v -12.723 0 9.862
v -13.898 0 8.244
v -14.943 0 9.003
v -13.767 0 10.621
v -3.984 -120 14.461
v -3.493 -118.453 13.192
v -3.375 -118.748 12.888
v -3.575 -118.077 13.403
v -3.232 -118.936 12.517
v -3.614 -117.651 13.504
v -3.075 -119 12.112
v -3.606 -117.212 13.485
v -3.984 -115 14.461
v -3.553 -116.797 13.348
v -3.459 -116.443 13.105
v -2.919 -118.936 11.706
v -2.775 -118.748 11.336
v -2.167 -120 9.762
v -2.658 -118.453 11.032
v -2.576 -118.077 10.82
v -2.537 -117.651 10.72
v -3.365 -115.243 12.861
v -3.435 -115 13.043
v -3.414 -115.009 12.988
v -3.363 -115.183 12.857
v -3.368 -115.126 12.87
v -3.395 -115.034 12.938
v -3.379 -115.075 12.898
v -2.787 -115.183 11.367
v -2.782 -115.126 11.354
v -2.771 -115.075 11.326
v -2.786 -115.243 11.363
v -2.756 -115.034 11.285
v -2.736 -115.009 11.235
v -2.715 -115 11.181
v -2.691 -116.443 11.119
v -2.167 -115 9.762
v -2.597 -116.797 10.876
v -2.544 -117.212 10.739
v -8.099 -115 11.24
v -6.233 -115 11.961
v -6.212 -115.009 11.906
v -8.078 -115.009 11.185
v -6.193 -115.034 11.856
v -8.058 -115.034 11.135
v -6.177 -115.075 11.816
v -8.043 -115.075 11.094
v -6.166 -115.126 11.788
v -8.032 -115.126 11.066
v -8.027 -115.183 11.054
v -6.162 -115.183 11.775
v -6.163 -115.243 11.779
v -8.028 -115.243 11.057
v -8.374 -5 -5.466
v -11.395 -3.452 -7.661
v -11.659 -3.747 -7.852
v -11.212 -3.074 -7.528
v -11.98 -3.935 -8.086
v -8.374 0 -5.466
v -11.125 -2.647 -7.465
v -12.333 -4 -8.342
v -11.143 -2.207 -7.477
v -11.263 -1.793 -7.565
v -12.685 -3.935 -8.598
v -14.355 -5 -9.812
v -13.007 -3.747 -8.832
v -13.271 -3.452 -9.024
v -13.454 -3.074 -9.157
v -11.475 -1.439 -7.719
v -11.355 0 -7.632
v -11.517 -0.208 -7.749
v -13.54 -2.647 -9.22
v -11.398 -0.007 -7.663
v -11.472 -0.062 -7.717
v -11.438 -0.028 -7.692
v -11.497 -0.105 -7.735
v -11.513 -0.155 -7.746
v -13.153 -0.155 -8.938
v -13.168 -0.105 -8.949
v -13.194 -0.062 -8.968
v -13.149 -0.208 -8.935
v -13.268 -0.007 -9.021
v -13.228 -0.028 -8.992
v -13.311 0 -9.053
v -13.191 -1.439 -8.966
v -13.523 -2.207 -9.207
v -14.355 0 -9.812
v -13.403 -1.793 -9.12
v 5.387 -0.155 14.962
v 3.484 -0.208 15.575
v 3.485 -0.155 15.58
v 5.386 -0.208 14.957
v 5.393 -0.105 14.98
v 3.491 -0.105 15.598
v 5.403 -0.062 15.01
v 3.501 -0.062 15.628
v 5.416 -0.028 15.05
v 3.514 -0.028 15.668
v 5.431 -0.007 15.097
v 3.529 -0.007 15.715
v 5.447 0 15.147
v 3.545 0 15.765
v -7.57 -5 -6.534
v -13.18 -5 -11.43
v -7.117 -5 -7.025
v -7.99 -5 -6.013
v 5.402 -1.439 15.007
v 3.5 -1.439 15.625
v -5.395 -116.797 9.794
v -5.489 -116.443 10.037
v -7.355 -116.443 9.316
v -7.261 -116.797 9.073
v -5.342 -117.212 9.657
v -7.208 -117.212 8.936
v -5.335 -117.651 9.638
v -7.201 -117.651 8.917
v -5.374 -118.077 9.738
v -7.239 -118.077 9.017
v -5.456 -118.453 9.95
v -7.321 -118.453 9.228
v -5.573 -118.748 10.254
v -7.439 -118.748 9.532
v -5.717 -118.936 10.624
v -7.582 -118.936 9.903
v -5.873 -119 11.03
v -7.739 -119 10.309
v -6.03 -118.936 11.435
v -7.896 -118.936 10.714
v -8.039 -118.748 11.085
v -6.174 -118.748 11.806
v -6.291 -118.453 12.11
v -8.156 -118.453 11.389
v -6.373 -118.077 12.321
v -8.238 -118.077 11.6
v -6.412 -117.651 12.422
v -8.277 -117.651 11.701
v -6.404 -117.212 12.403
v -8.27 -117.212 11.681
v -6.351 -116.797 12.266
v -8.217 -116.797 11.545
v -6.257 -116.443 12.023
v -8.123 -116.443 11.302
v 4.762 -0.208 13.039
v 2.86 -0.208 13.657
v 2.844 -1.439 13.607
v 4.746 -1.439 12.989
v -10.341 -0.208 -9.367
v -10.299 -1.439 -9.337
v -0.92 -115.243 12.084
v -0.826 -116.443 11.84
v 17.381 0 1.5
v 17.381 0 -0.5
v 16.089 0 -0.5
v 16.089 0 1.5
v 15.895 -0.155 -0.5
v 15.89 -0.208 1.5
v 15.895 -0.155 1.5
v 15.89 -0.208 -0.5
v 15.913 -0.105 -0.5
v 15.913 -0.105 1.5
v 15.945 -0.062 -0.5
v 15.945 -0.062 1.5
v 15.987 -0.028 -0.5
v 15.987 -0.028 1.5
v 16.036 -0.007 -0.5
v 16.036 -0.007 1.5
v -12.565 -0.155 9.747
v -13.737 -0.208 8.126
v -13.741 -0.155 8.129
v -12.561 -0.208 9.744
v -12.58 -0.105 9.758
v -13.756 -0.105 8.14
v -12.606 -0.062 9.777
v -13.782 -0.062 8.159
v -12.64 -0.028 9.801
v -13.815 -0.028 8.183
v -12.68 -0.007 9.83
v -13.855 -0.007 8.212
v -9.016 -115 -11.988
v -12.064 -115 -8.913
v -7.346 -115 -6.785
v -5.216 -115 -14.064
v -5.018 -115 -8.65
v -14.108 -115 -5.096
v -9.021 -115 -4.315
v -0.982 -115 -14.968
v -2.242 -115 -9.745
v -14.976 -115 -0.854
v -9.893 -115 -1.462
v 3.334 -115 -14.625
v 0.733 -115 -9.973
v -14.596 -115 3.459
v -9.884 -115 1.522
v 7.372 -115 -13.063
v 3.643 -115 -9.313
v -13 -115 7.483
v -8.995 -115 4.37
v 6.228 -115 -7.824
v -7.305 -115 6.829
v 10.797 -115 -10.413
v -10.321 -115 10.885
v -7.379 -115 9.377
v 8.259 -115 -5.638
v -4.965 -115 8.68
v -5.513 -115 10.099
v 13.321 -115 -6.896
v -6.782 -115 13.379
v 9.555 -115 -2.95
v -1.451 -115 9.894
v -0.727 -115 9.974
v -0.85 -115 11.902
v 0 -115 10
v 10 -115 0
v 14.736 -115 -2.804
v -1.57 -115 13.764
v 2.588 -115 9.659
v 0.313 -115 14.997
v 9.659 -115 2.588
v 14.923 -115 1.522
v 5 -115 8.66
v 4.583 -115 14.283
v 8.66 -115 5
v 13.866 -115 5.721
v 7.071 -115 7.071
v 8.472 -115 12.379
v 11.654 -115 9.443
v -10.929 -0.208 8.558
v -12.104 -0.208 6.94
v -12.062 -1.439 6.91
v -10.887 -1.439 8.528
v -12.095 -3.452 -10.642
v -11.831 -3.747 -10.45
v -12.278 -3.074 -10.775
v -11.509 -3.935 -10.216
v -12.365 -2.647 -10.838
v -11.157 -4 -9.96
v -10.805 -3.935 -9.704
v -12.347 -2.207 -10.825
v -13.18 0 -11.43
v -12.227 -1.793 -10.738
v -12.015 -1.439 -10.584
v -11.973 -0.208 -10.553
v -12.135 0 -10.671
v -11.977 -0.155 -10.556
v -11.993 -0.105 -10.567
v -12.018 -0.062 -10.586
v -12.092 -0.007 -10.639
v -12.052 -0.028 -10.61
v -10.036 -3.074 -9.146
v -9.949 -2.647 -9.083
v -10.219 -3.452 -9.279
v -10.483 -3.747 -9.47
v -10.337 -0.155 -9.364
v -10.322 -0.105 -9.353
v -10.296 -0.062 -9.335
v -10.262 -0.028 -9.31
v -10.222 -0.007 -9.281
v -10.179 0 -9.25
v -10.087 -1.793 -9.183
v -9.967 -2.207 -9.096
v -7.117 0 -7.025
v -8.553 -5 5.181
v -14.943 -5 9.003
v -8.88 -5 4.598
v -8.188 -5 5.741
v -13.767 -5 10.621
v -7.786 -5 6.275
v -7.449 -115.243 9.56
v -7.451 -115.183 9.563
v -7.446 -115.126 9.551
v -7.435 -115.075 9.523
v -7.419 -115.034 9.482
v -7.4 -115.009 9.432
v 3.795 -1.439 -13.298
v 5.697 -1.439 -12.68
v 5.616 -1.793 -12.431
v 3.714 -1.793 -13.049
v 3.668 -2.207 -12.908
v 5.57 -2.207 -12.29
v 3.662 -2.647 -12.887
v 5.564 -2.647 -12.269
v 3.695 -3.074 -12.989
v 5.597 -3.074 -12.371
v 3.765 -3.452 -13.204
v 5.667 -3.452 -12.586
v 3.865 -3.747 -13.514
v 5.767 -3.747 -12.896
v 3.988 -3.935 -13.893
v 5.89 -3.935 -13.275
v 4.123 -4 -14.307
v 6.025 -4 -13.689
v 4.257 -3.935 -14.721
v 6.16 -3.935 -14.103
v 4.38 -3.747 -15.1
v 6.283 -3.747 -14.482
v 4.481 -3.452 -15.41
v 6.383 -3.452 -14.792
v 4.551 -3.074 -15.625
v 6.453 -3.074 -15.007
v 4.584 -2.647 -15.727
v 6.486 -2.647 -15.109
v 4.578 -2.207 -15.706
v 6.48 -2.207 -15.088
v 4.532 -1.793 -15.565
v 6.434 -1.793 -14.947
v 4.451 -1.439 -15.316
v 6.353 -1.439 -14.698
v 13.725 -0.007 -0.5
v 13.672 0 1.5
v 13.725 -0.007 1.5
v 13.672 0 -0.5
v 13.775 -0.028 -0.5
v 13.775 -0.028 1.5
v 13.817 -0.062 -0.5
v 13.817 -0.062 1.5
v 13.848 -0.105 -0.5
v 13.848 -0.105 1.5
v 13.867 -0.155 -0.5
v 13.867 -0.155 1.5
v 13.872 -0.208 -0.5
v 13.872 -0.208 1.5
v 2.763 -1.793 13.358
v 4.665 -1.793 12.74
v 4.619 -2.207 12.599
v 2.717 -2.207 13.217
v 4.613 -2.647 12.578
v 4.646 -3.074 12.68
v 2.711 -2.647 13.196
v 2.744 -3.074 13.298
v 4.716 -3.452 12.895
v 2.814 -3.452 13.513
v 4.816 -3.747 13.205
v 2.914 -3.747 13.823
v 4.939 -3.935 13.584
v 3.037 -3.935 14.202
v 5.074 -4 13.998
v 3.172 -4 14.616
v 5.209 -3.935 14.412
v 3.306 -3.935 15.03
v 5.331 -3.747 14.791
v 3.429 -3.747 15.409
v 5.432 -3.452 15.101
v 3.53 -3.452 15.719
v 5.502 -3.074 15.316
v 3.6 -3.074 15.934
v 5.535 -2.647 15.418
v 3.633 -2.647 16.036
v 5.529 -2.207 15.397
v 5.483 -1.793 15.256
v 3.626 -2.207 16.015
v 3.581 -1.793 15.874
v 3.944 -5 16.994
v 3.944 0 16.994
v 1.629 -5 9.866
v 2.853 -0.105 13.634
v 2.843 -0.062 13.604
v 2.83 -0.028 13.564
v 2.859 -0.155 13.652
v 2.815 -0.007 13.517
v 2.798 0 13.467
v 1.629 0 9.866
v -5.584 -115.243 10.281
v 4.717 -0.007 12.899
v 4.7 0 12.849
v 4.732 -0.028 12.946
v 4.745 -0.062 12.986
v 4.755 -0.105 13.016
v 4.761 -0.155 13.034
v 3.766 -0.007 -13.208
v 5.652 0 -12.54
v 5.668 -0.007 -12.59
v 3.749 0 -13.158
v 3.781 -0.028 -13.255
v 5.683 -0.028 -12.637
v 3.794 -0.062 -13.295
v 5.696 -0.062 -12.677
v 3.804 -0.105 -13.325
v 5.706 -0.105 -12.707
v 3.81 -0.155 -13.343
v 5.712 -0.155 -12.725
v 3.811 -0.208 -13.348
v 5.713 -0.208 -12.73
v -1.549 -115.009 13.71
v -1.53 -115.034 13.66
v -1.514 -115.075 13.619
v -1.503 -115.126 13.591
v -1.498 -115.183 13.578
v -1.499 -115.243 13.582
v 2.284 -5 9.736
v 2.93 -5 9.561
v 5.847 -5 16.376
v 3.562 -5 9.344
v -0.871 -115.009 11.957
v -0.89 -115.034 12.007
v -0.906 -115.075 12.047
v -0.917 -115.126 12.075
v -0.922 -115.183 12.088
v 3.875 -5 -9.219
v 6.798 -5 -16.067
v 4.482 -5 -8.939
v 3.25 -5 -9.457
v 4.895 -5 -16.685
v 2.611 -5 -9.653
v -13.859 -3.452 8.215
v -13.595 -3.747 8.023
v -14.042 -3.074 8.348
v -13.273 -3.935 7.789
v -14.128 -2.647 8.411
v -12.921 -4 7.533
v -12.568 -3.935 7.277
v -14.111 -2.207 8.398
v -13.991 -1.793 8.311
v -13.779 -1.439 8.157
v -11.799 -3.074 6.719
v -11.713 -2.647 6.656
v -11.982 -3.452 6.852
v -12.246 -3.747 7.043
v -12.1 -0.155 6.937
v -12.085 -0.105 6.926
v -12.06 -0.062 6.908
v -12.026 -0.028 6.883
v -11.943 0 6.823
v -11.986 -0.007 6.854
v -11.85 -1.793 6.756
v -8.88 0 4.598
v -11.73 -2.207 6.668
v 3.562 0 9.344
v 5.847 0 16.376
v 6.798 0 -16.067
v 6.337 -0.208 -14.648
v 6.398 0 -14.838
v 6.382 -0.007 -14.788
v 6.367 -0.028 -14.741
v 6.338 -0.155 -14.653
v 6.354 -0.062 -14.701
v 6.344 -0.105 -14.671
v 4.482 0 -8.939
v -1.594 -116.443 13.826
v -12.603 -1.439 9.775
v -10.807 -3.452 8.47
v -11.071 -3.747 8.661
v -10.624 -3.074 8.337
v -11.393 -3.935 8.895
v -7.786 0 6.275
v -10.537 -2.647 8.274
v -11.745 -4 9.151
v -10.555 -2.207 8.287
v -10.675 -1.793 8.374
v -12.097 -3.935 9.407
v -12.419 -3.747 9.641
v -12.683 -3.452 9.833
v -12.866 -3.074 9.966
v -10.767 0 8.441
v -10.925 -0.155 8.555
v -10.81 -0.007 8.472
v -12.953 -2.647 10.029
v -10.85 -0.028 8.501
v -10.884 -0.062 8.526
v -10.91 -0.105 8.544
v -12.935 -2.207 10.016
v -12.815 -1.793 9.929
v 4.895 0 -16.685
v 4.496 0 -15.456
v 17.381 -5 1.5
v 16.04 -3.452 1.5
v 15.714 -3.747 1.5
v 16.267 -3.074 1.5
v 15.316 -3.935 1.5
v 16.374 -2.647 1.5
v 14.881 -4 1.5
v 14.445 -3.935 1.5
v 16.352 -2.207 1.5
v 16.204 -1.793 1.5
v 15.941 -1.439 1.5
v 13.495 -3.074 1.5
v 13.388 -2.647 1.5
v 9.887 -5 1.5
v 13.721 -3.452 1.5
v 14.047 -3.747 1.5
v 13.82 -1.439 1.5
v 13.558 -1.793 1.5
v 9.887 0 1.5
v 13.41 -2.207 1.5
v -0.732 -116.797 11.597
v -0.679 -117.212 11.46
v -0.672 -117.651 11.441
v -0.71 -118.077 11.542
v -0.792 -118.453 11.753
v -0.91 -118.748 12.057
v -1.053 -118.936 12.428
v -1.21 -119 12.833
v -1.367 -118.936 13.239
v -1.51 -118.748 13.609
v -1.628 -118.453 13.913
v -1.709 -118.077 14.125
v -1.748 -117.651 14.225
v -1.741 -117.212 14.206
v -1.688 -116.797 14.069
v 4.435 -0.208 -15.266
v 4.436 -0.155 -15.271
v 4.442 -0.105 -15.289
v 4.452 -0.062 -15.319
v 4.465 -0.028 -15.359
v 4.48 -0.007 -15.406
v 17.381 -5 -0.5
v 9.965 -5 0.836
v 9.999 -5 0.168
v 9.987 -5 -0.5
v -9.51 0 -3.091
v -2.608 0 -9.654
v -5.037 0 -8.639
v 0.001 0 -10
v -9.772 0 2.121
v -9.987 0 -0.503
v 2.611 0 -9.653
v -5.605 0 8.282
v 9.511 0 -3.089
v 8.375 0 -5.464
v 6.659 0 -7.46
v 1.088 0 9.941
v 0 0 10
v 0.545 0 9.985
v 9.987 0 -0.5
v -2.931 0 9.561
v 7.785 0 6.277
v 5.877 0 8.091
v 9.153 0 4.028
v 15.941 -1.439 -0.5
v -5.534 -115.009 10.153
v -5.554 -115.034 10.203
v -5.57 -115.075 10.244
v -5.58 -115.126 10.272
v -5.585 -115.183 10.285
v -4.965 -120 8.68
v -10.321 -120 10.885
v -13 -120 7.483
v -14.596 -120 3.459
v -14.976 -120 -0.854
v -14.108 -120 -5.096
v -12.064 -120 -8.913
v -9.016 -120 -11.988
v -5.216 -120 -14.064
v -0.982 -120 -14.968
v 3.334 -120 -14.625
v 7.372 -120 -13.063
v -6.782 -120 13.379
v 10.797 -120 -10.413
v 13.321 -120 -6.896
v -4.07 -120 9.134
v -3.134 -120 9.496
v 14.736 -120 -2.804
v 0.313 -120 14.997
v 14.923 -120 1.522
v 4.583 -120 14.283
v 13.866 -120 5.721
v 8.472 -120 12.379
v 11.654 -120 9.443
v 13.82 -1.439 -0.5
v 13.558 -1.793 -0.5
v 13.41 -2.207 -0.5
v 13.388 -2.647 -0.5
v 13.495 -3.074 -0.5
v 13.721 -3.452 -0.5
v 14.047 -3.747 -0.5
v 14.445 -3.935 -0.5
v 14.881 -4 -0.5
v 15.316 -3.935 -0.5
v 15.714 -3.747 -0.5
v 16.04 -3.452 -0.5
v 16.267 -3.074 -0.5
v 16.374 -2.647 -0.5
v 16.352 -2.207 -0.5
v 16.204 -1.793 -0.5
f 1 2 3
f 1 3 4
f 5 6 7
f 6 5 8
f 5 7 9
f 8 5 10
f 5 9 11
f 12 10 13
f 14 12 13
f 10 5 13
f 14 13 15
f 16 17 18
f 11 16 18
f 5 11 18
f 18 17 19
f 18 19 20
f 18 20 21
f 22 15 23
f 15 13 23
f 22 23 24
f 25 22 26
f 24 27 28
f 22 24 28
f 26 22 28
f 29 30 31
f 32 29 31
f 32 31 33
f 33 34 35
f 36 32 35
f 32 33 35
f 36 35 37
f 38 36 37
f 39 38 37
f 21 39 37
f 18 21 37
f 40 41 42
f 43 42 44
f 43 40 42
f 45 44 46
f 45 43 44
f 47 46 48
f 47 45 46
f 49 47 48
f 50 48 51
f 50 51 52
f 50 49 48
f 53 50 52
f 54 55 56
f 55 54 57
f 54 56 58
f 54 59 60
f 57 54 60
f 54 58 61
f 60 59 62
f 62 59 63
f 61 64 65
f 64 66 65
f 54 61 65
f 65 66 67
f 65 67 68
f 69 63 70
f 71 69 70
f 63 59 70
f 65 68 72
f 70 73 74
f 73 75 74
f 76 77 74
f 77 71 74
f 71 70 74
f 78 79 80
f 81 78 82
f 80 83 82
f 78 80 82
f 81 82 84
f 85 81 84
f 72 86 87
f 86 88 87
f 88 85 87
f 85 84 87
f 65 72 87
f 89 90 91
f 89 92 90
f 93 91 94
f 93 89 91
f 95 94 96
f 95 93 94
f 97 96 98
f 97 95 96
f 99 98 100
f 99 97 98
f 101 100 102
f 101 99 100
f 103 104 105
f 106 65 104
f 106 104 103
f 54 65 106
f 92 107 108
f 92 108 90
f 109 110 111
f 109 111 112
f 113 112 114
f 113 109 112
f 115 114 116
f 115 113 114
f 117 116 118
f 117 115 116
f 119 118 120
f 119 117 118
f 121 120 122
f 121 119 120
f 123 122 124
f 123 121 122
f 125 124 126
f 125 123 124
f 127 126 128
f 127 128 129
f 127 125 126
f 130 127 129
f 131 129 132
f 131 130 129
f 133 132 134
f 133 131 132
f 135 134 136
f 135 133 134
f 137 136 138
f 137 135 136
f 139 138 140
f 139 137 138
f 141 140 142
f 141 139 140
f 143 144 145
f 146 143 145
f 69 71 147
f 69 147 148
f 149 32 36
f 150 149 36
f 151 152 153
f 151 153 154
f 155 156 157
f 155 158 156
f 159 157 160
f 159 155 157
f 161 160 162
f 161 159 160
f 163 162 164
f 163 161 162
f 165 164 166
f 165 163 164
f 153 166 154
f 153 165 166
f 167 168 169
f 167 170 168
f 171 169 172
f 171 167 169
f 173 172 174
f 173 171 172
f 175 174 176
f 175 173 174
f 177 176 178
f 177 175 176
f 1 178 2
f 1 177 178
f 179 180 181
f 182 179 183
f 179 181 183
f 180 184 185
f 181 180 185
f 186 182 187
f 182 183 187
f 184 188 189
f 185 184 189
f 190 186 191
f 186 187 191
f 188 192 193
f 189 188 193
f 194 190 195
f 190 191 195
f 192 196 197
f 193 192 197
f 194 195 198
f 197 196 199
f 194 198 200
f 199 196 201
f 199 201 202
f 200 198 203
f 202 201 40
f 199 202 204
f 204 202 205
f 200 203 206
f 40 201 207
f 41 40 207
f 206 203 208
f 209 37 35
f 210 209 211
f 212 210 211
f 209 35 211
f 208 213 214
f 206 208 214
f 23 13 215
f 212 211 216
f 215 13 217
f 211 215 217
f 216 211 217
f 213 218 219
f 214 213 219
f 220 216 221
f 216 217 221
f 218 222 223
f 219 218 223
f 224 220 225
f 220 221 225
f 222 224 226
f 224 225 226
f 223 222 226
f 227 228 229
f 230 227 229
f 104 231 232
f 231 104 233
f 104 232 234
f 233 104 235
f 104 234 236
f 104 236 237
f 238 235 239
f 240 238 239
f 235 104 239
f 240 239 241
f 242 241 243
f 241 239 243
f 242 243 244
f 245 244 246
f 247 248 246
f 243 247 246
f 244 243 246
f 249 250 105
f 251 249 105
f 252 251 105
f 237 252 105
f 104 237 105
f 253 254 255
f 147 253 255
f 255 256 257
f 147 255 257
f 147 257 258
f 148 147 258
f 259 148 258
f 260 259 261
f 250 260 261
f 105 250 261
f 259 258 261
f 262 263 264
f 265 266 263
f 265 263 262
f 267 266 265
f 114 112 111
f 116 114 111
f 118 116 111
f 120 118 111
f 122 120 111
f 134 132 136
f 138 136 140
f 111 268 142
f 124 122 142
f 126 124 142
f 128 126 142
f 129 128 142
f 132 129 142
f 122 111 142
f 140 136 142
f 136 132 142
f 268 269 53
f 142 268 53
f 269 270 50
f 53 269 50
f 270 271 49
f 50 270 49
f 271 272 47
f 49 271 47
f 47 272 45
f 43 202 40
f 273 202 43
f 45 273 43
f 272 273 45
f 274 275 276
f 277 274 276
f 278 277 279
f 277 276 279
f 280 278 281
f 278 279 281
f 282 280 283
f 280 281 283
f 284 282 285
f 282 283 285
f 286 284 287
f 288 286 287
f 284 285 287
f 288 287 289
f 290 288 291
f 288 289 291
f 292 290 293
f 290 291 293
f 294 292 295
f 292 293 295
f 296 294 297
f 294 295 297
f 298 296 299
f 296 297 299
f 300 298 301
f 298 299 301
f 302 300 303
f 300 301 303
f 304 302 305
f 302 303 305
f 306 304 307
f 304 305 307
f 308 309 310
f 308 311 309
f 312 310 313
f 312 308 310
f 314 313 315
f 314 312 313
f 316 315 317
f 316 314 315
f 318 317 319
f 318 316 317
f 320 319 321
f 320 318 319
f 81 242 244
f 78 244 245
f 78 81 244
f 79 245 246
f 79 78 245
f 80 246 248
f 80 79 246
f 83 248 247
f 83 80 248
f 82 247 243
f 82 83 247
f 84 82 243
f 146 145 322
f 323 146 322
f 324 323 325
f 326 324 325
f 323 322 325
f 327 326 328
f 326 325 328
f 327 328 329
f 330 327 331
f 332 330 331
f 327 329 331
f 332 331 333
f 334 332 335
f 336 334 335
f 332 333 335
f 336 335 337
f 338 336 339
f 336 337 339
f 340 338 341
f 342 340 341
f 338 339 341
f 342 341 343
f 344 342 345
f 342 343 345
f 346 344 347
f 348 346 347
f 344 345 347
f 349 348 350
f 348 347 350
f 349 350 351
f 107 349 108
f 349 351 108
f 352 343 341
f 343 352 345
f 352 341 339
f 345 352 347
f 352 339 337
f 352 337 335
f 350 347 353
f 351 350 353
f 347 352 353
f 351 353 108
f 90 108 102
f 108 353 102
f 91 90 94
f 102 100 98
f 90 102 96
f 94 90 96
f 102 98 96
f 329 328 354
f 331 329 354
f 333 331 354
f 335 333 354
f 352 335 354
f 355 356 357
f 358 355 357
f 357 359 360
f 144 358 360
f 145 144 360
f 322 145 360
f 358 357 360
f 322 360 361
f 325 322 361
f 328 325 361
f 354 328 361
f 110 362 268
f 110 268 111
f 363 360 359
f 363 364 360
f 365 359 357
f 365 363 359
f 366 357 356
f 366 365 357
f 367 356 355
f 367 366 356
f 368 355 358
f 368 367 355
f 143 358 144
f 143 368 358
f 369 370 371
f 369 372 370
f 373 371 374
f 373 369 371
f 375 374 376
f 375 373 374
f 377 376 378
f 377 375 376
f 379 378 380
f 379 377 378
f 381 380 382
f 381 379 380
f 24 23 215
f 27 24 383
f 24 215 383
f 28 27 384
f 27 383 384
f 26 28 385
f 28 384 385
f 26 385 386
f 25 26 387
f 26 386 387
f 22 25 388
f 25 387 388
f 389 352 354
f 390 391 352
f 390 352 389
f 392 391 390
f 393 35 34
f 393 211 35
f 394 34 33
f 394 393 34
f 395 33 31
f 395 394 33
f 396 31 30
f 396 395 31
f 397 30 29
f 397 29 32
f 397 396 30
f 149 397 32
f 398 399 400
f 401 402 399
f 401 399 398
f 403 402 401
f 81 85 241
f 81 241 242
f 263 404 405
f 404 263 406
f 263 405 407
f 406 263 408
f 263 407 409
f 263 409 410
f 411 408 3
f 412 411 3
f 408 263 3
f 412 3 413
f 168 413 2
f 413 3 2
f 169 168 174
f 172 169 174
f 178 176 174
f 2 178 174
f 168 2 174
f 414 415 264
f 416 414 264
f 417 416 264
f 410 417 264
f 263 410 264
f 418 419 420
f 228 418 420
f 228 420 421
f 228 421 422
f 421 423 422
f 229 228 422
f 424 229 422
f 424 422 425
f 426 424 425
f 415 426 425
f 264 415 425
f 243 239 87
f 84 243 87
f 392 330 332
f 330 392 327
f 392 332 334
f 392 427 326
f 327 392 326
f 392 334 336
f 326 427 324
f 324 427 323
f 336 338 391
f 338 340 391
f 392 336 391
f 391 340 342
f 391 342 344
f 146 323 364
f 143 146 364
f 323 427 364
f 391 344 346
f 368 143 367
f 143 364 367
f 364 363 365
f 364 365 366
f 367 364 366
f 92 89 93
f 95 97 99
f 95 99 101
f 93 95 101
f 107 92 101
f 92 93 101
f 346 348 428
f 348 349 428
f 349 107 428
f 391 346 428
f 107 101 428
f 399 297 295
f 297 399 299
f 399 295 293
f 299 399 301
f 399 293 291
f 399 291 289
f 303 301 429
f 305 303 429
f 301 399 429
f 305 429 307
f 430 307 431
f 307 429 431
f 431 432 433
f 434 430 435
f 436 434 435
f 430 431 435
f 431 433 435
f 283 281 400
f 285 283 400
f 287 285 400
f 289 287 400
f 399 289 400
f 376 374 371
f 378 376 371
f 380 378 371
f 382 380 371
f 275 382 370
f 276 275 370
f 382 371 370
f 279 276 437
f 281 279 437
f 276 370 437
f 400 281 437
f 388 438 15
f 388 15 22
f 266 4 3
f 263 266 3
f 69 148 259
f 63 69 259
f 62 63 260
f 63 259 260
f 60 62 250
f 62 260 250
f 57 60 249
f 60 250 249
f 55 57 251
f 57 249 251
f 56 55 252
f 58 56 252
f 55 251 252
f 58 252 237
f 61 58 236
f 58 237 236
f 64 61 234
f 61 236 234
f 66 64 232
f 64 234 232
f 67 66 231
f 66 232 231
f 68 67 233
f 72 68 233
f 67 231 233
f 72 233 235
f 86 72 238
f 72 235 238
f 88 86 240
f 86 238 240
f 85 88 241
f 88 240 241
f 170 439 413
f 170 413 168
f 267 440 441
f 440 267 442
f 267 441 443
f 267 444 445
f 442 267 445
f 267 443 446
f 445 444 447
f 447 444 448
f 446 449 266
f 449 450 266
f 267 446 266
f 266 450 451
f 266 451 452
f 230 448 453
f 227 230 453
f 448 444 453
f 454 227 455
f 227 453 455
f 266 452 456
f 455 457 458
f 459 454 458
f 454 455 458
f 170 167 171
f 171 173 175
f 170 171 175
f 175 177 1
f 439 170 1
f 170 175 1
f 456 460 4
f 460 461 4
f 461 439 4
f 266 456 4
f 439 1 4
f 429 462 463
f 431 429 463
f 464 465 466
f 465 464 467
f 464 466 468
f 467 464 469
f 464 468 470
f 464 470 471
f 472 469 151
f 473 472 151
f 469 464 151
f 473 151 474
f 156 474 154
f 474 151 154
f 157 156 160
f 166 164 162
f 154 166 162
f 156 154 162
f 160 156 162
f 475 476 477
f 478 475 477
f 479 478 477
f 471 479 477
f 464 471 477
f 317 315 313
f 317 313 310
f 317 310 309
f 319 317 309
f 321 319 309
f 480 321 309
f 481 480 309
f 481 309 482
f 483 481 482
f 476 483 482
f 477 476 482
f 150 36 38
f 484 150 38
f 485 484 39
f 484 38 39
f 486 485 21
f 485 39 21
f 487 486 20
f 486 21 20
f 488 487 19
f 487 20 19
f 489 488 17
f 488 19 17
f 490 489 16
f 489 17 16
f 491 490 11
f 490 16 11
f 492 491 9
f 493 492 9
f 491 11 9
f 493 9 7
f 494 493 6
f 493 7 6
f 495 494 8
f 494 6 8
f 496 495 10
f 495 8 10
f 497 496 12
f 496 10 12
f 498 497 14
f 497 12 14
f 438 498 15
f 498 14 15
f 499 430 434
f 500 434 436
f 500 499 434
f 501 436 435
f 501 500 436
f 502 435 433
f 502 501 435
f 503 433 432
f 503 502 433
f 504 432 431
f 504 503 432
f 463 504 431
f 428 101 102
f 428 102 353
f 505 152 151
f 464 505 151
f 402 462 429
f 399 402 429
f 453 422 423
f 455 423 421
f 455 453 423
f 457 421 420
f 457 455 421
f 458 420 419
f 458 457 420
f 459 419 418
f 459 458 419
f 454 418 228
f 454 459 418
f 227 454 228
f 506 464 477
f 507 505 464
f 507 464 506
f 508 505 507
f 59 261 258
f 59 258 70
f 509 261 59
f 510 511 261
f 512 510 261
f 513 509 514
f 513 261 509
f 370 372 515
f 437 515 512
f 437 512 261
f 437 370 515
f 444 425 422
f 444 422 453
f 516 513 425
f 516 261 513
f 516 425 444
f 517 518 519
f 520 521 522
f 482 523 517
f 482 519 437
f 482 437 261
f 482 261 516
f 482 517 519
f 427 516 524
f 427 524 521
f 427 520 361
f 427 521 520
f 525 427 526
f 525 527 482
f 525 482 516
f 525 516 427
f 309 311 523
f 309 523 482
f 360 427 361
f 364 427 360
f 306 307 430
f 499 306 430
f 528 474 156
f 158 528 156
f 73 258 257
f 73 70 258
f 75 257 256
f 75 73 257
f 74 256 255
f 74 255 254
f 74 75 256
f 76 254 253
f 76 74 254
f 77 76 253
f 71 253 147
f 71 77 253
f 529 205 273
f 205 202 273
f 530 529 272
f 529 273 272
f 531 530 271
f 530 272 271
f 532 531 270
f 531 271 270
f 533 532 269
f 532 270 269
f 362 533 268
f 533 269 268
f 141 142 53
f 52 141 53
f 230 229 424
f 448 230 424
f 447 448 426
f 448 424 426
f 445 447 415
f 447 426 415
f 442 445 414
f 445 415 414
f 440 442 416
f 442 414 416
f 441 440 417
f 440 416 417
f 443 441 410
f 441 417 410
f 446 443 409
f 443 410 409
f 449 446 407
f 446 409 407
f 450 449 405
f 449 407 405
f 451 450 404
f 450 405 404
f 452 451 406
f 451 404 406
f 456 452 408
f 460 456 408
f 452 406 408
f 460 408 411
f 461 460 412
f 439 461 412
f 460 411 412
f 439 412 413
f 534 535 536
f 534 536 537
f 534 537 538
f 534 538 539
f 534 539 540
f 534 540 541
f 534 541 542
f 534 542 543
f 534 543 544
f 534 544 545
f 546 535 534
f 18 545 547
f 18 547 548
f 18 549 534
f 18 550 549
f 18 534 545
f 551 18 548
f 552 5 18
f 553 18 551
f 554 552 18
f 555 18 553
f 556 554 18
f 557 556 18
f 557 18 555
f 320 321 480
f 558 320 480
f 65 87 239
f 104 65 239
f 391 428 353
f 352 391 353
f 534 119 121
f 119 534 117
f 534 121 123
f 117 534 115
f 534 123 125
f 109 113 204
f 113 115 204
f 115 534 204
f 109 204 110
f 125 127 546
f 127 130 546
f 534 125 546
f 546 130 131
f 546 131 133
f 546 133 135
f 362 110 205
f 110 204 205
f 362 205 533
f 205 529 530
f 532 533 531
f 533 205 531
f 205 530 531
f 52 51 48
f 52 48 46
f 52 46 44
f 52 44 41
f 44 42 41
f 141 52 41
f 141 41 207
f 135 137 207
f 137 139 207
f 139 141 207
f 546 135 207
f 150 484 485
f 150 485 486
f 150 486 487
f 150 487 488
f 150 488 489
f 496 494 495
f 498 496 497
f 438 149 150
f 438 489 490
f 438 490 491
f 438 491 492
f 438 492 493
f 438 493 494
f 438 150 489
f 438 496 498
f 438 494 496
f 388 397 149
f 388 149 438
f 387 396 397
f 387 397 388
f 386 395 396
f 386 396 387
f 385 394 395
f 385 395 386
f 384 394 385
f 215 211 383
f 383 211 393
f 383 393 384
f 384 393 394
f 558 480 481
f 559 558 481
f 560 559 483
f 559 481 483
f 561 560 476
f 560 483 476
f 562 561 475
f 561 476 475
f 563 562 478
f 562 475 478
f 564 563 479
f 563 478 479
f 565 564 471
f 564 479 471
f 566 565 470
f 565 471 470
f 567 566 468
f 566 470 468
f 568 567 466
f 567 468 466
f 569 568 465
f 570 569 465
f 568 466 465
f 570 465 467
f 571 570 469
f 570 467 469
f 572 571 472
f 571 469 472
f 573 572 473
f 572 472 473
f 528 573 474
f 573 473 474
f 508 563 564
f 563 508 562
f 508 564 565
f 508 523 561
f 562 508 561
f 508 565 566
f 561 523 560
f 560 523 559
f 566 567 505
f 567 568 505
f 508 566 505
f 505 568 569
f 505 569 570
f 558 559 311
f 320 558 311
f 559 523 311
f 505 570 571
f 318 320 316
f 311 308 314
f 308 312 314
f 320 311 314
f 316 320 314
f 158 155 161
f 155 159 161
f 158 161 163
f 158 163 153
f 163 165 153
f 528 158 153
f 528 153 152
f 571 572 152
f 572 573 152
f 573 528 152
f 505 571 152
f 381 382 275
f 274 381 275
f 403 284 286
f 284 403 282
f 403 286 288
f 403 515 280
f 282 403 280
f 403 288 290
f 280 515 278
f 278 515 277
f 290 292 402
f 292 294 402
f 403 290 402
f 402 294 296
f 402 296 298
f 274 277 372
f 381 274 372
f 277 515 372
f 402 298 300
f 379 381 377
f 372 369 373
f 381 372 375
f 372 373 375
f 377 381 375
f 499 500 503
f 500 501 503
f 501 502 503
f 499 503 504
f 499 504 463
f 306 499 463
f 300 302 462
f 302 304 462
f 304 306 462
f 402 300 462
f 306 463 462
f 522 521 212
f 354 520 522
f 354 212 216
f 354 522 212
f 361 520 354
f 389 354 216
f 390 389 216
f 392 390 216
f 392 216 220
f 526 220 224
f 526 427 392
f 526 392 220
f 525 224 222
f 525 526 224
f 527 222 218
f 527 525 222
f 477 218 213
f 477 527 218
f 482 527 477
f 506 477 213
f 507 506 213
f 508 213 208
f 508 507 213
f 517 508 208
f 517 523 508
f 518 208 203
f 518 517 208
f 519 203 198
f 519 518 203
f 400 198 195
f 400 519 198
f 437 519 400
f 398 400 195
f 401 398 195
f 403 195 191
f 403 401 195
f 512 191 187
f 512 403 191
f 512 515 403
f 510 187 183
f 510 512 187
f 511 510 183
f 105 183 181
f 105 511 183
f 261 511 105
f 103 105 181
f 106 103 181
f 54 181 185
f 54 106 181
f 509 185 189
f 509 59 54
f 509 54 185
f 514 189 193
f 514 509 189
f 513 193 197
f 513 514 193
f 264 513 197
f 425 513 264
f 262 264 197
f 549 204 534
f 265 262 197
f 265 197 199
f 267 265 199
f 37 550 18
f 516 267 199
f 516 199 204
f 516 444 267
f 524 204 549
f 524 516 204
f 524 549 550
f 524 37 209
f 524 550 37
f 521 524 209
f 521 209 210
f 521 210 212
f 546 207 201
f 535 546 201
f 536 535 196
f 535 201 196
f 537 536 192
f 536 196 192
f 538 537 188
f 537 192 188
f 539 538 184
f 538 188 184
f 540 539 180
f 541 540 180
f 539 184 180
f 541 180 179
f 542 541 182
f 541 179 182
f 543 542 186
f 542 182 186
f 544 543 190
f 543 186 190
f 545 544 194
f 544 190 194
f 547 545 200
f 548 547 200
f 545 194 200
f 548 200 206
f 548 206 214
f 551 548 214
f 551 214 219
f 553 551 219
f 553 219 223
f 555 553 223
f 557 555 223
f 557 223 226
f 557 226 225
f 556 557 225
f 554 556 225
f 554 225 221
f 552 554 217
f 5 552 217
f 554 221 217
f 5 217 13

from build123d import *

# Parameters (mm, degrees)
ESQUISSE1_R               = 10
BASE_DEPTH                = 120
BOSS_BALEINE_DEPTH        = 5
VIDE_BALEINE_DEPTH        = 3
REP_SUPPORT_BALEINE_COUNT = 5
CONGE_BALEINE_R           = 0.2
BOSS_EXTRU_3_START        = -5
BOSS_EXTRU_3_DEPTH        = 5
ENL_V_MAT_EXTRU_1_DEPTH   = 2
CONG_1_R                  = 0.2
CONG_1_OF_SYM_VIDE_BLOC_R = 0.2


with BuildPart() as part:
    # Esquisse1 → BASE (new body)
    with BuildSketch(Plane(origin=(0, 0, 0), x_dir=(1, 0, 0), z_dir=(0, 1, 0))):
        with Locations(Location((0, 0, 0), (0, 0, 270))):
            Circle(ESQUISSE1_R)
    extrude(amount=-BASE_DEPTH)

    # Esquisse2 → BOSS - BALEINE (add)
    with BuildSketch(Plane(origin=(0, 0, 0), x_dir=(1, 0, 0), z_dir=(0, 1, 0))):
        with BuildLine():
            ThreePointArc((9.38083152, -1.5), (9.486684928, -0.502801231), (9.486832981, 0.5))
            Line((9.486832981, 0.5), (17.38083152, 0.5))
            Line((17.38083152, 0.5), (17.38083152, -1.5))
            Line((17.38083152, -1.5), (9.38083152, -1.5))
        make_face()
    boss_baleine = extrude(amount=-BOSS_BALEINE_DEPTH)

    # Esquisse3 → VIDE - BALEINE (cut)
    with BuildSketch(Plane.XY.offset(1.5)):
        with BuildLine():
            Line((13.88083152, 0), (13.820171348, -1.439339828))
            ThreePointArc((13.820171348, -1.439339828), (14.88083152, -4), (15.941491691, -1.439339828))
            Line((15.941491691, -1.439339828), (15.88083152, 0))
            Line((15.88083152, 0), (13.88083152, 0))
        make_face()
    vide_baleine = extrude(amount=-VIDE_BALEINE_DEPTH, mode=Mode.SUBTRACT)

    # REP - SUPPORT BALEINE: BOSS - BALEINE, VIDE - BALEINE ×5 about axis
    rep_support_baleine_axis = Axis((0, 0, 0), (0, 1, 0))
    add([boss_baleine.rotate(rep_support_baleine_axis, i * 360 / REP_SUPPORT_BALEINE_COUNT) for i in range(1, REP_SUPPORT_BALEINE_COUNT)])
    add([vide_baleine.rotate(rep_support_baleine_axis, i * 360 / REP_SUPPORT_BALEINE_COUNT) for i in range(1, REP_SUPPORT_BALEINE_COUNT)], mode=Mode.SUBTRACT)

    # CONGE BALEINE
    conge_baleine_edges = [part.edges().sort_by_distance(p)[0] for p in [
        (4.764941094, 0, -13.046946771),
        (5.382975083, 0, -14.949059804),
        (-10.935935969, 0, -8.563456554),
        (-12.553969958, 0, -9.739027059),
        (-11.523721222, 0, 7.75443956),
        (-13.14175521, 0, 8.930010064),
        (3.813884577, 0, 13.355963766),
        (4.431918566, 0, 15.258076798),
        (13.88083152, 0, 0.5),
        (15.88083152, 0, 0.5),
    ]]
    fillet(conge_baleine_edges, radius=CONGE_BALEINE_R)

    # Esquisse4 → Boss.-Extru.3 (add)
    with BuildSketch(Plane.XZ.offset(120).offset(BOSS_EXTRU_3_START)):
        with BuildLine():
            ThreePointArc((10, 0), (-5.017525477, -8.650112027), (-4.964887617, 8.680431496))
            Line((-4.964887617, 8.680431496), (-6.781900496, 13.379305874))
            ThreePointArc((-6.781900496, 13.379305874), (5.409975206, -13.990431311), (-3.983814234, 14.461300915))
            Line((-3.983814234, 14.461300915), (-2.166801355, 9.762426537))
            ThreePointArc((-2.166801355, 9.762426537), (6.258273981, 7.799615809), (10, 0))
        make_face()
    extrude(amount=BOSS_EXTRU_3_DEPTH)

    # Esquisse5 → Enlèv. mat.-Extru.1 (cut)
    with BuildSketch(Plane(origin=(-1.399043131, 0, -0.540997521), x_dir=(0.36066501374715604, 0, -0.9326954207343167), z_dir=(0.9326954207343167, 0, 0.36066501374715604))):
        with BuildLine():
            Line((-13.470498479, -116.443357535), (-13.155835762, -115))
            Line((-13.155835762, -115), (-11.655835762, -115))
            Line((-11.655835762, -115), (-11.341173044, -116.443357535))
            ThreePointArc((-11.341173044, -116.443357535), (-12.405835762, -119), (-13.470498479, -116.443357535))
        make_face()
    enl_v_mat_extru_1 = extrude(amount=-ENL_V_MAT_EXTRU_1_DEPTH, mode=Mode.SUBTRACT)

    # Congé1
    cong_1_edges = [part.edges().sort_by_distance(p)[0] for p in [
        (-7.076588238, -115, 11.368725236),
        (-6.535590717, -115, 9.969682105),
    ]]
    fillet(cong_1_edges, radius=CONG_1_R)

    # SYM VIDE BLOC: Enlèv. mat.-Extru.1 across plane
    add(enl_v_mat_extru_1.mirror(Plane(origin=(0, 0, 0), x_dir=(-0.3606650137471561, 0, 0.9326954207343165), z_dir=(0.9326954207343167, 0, 0.36066501374715604))), mode=Mode.SUBTRACT)

    # Congé1 of SYM VIDE BLOC
    cong_1_of_sym_vide_bloc_edges = [part.edges().sort_by_distance(p)[0] for p in [
        (-2.413111134, -115, 13.172050305),
        (-1.872113613, -115, 11.773007174),
    ]]
    fillet(cong_1_of_sym_vide_bloc_edges, radius=CONG_1_OF_SYM_VIDE_BLOC_R)


solid = part.part
